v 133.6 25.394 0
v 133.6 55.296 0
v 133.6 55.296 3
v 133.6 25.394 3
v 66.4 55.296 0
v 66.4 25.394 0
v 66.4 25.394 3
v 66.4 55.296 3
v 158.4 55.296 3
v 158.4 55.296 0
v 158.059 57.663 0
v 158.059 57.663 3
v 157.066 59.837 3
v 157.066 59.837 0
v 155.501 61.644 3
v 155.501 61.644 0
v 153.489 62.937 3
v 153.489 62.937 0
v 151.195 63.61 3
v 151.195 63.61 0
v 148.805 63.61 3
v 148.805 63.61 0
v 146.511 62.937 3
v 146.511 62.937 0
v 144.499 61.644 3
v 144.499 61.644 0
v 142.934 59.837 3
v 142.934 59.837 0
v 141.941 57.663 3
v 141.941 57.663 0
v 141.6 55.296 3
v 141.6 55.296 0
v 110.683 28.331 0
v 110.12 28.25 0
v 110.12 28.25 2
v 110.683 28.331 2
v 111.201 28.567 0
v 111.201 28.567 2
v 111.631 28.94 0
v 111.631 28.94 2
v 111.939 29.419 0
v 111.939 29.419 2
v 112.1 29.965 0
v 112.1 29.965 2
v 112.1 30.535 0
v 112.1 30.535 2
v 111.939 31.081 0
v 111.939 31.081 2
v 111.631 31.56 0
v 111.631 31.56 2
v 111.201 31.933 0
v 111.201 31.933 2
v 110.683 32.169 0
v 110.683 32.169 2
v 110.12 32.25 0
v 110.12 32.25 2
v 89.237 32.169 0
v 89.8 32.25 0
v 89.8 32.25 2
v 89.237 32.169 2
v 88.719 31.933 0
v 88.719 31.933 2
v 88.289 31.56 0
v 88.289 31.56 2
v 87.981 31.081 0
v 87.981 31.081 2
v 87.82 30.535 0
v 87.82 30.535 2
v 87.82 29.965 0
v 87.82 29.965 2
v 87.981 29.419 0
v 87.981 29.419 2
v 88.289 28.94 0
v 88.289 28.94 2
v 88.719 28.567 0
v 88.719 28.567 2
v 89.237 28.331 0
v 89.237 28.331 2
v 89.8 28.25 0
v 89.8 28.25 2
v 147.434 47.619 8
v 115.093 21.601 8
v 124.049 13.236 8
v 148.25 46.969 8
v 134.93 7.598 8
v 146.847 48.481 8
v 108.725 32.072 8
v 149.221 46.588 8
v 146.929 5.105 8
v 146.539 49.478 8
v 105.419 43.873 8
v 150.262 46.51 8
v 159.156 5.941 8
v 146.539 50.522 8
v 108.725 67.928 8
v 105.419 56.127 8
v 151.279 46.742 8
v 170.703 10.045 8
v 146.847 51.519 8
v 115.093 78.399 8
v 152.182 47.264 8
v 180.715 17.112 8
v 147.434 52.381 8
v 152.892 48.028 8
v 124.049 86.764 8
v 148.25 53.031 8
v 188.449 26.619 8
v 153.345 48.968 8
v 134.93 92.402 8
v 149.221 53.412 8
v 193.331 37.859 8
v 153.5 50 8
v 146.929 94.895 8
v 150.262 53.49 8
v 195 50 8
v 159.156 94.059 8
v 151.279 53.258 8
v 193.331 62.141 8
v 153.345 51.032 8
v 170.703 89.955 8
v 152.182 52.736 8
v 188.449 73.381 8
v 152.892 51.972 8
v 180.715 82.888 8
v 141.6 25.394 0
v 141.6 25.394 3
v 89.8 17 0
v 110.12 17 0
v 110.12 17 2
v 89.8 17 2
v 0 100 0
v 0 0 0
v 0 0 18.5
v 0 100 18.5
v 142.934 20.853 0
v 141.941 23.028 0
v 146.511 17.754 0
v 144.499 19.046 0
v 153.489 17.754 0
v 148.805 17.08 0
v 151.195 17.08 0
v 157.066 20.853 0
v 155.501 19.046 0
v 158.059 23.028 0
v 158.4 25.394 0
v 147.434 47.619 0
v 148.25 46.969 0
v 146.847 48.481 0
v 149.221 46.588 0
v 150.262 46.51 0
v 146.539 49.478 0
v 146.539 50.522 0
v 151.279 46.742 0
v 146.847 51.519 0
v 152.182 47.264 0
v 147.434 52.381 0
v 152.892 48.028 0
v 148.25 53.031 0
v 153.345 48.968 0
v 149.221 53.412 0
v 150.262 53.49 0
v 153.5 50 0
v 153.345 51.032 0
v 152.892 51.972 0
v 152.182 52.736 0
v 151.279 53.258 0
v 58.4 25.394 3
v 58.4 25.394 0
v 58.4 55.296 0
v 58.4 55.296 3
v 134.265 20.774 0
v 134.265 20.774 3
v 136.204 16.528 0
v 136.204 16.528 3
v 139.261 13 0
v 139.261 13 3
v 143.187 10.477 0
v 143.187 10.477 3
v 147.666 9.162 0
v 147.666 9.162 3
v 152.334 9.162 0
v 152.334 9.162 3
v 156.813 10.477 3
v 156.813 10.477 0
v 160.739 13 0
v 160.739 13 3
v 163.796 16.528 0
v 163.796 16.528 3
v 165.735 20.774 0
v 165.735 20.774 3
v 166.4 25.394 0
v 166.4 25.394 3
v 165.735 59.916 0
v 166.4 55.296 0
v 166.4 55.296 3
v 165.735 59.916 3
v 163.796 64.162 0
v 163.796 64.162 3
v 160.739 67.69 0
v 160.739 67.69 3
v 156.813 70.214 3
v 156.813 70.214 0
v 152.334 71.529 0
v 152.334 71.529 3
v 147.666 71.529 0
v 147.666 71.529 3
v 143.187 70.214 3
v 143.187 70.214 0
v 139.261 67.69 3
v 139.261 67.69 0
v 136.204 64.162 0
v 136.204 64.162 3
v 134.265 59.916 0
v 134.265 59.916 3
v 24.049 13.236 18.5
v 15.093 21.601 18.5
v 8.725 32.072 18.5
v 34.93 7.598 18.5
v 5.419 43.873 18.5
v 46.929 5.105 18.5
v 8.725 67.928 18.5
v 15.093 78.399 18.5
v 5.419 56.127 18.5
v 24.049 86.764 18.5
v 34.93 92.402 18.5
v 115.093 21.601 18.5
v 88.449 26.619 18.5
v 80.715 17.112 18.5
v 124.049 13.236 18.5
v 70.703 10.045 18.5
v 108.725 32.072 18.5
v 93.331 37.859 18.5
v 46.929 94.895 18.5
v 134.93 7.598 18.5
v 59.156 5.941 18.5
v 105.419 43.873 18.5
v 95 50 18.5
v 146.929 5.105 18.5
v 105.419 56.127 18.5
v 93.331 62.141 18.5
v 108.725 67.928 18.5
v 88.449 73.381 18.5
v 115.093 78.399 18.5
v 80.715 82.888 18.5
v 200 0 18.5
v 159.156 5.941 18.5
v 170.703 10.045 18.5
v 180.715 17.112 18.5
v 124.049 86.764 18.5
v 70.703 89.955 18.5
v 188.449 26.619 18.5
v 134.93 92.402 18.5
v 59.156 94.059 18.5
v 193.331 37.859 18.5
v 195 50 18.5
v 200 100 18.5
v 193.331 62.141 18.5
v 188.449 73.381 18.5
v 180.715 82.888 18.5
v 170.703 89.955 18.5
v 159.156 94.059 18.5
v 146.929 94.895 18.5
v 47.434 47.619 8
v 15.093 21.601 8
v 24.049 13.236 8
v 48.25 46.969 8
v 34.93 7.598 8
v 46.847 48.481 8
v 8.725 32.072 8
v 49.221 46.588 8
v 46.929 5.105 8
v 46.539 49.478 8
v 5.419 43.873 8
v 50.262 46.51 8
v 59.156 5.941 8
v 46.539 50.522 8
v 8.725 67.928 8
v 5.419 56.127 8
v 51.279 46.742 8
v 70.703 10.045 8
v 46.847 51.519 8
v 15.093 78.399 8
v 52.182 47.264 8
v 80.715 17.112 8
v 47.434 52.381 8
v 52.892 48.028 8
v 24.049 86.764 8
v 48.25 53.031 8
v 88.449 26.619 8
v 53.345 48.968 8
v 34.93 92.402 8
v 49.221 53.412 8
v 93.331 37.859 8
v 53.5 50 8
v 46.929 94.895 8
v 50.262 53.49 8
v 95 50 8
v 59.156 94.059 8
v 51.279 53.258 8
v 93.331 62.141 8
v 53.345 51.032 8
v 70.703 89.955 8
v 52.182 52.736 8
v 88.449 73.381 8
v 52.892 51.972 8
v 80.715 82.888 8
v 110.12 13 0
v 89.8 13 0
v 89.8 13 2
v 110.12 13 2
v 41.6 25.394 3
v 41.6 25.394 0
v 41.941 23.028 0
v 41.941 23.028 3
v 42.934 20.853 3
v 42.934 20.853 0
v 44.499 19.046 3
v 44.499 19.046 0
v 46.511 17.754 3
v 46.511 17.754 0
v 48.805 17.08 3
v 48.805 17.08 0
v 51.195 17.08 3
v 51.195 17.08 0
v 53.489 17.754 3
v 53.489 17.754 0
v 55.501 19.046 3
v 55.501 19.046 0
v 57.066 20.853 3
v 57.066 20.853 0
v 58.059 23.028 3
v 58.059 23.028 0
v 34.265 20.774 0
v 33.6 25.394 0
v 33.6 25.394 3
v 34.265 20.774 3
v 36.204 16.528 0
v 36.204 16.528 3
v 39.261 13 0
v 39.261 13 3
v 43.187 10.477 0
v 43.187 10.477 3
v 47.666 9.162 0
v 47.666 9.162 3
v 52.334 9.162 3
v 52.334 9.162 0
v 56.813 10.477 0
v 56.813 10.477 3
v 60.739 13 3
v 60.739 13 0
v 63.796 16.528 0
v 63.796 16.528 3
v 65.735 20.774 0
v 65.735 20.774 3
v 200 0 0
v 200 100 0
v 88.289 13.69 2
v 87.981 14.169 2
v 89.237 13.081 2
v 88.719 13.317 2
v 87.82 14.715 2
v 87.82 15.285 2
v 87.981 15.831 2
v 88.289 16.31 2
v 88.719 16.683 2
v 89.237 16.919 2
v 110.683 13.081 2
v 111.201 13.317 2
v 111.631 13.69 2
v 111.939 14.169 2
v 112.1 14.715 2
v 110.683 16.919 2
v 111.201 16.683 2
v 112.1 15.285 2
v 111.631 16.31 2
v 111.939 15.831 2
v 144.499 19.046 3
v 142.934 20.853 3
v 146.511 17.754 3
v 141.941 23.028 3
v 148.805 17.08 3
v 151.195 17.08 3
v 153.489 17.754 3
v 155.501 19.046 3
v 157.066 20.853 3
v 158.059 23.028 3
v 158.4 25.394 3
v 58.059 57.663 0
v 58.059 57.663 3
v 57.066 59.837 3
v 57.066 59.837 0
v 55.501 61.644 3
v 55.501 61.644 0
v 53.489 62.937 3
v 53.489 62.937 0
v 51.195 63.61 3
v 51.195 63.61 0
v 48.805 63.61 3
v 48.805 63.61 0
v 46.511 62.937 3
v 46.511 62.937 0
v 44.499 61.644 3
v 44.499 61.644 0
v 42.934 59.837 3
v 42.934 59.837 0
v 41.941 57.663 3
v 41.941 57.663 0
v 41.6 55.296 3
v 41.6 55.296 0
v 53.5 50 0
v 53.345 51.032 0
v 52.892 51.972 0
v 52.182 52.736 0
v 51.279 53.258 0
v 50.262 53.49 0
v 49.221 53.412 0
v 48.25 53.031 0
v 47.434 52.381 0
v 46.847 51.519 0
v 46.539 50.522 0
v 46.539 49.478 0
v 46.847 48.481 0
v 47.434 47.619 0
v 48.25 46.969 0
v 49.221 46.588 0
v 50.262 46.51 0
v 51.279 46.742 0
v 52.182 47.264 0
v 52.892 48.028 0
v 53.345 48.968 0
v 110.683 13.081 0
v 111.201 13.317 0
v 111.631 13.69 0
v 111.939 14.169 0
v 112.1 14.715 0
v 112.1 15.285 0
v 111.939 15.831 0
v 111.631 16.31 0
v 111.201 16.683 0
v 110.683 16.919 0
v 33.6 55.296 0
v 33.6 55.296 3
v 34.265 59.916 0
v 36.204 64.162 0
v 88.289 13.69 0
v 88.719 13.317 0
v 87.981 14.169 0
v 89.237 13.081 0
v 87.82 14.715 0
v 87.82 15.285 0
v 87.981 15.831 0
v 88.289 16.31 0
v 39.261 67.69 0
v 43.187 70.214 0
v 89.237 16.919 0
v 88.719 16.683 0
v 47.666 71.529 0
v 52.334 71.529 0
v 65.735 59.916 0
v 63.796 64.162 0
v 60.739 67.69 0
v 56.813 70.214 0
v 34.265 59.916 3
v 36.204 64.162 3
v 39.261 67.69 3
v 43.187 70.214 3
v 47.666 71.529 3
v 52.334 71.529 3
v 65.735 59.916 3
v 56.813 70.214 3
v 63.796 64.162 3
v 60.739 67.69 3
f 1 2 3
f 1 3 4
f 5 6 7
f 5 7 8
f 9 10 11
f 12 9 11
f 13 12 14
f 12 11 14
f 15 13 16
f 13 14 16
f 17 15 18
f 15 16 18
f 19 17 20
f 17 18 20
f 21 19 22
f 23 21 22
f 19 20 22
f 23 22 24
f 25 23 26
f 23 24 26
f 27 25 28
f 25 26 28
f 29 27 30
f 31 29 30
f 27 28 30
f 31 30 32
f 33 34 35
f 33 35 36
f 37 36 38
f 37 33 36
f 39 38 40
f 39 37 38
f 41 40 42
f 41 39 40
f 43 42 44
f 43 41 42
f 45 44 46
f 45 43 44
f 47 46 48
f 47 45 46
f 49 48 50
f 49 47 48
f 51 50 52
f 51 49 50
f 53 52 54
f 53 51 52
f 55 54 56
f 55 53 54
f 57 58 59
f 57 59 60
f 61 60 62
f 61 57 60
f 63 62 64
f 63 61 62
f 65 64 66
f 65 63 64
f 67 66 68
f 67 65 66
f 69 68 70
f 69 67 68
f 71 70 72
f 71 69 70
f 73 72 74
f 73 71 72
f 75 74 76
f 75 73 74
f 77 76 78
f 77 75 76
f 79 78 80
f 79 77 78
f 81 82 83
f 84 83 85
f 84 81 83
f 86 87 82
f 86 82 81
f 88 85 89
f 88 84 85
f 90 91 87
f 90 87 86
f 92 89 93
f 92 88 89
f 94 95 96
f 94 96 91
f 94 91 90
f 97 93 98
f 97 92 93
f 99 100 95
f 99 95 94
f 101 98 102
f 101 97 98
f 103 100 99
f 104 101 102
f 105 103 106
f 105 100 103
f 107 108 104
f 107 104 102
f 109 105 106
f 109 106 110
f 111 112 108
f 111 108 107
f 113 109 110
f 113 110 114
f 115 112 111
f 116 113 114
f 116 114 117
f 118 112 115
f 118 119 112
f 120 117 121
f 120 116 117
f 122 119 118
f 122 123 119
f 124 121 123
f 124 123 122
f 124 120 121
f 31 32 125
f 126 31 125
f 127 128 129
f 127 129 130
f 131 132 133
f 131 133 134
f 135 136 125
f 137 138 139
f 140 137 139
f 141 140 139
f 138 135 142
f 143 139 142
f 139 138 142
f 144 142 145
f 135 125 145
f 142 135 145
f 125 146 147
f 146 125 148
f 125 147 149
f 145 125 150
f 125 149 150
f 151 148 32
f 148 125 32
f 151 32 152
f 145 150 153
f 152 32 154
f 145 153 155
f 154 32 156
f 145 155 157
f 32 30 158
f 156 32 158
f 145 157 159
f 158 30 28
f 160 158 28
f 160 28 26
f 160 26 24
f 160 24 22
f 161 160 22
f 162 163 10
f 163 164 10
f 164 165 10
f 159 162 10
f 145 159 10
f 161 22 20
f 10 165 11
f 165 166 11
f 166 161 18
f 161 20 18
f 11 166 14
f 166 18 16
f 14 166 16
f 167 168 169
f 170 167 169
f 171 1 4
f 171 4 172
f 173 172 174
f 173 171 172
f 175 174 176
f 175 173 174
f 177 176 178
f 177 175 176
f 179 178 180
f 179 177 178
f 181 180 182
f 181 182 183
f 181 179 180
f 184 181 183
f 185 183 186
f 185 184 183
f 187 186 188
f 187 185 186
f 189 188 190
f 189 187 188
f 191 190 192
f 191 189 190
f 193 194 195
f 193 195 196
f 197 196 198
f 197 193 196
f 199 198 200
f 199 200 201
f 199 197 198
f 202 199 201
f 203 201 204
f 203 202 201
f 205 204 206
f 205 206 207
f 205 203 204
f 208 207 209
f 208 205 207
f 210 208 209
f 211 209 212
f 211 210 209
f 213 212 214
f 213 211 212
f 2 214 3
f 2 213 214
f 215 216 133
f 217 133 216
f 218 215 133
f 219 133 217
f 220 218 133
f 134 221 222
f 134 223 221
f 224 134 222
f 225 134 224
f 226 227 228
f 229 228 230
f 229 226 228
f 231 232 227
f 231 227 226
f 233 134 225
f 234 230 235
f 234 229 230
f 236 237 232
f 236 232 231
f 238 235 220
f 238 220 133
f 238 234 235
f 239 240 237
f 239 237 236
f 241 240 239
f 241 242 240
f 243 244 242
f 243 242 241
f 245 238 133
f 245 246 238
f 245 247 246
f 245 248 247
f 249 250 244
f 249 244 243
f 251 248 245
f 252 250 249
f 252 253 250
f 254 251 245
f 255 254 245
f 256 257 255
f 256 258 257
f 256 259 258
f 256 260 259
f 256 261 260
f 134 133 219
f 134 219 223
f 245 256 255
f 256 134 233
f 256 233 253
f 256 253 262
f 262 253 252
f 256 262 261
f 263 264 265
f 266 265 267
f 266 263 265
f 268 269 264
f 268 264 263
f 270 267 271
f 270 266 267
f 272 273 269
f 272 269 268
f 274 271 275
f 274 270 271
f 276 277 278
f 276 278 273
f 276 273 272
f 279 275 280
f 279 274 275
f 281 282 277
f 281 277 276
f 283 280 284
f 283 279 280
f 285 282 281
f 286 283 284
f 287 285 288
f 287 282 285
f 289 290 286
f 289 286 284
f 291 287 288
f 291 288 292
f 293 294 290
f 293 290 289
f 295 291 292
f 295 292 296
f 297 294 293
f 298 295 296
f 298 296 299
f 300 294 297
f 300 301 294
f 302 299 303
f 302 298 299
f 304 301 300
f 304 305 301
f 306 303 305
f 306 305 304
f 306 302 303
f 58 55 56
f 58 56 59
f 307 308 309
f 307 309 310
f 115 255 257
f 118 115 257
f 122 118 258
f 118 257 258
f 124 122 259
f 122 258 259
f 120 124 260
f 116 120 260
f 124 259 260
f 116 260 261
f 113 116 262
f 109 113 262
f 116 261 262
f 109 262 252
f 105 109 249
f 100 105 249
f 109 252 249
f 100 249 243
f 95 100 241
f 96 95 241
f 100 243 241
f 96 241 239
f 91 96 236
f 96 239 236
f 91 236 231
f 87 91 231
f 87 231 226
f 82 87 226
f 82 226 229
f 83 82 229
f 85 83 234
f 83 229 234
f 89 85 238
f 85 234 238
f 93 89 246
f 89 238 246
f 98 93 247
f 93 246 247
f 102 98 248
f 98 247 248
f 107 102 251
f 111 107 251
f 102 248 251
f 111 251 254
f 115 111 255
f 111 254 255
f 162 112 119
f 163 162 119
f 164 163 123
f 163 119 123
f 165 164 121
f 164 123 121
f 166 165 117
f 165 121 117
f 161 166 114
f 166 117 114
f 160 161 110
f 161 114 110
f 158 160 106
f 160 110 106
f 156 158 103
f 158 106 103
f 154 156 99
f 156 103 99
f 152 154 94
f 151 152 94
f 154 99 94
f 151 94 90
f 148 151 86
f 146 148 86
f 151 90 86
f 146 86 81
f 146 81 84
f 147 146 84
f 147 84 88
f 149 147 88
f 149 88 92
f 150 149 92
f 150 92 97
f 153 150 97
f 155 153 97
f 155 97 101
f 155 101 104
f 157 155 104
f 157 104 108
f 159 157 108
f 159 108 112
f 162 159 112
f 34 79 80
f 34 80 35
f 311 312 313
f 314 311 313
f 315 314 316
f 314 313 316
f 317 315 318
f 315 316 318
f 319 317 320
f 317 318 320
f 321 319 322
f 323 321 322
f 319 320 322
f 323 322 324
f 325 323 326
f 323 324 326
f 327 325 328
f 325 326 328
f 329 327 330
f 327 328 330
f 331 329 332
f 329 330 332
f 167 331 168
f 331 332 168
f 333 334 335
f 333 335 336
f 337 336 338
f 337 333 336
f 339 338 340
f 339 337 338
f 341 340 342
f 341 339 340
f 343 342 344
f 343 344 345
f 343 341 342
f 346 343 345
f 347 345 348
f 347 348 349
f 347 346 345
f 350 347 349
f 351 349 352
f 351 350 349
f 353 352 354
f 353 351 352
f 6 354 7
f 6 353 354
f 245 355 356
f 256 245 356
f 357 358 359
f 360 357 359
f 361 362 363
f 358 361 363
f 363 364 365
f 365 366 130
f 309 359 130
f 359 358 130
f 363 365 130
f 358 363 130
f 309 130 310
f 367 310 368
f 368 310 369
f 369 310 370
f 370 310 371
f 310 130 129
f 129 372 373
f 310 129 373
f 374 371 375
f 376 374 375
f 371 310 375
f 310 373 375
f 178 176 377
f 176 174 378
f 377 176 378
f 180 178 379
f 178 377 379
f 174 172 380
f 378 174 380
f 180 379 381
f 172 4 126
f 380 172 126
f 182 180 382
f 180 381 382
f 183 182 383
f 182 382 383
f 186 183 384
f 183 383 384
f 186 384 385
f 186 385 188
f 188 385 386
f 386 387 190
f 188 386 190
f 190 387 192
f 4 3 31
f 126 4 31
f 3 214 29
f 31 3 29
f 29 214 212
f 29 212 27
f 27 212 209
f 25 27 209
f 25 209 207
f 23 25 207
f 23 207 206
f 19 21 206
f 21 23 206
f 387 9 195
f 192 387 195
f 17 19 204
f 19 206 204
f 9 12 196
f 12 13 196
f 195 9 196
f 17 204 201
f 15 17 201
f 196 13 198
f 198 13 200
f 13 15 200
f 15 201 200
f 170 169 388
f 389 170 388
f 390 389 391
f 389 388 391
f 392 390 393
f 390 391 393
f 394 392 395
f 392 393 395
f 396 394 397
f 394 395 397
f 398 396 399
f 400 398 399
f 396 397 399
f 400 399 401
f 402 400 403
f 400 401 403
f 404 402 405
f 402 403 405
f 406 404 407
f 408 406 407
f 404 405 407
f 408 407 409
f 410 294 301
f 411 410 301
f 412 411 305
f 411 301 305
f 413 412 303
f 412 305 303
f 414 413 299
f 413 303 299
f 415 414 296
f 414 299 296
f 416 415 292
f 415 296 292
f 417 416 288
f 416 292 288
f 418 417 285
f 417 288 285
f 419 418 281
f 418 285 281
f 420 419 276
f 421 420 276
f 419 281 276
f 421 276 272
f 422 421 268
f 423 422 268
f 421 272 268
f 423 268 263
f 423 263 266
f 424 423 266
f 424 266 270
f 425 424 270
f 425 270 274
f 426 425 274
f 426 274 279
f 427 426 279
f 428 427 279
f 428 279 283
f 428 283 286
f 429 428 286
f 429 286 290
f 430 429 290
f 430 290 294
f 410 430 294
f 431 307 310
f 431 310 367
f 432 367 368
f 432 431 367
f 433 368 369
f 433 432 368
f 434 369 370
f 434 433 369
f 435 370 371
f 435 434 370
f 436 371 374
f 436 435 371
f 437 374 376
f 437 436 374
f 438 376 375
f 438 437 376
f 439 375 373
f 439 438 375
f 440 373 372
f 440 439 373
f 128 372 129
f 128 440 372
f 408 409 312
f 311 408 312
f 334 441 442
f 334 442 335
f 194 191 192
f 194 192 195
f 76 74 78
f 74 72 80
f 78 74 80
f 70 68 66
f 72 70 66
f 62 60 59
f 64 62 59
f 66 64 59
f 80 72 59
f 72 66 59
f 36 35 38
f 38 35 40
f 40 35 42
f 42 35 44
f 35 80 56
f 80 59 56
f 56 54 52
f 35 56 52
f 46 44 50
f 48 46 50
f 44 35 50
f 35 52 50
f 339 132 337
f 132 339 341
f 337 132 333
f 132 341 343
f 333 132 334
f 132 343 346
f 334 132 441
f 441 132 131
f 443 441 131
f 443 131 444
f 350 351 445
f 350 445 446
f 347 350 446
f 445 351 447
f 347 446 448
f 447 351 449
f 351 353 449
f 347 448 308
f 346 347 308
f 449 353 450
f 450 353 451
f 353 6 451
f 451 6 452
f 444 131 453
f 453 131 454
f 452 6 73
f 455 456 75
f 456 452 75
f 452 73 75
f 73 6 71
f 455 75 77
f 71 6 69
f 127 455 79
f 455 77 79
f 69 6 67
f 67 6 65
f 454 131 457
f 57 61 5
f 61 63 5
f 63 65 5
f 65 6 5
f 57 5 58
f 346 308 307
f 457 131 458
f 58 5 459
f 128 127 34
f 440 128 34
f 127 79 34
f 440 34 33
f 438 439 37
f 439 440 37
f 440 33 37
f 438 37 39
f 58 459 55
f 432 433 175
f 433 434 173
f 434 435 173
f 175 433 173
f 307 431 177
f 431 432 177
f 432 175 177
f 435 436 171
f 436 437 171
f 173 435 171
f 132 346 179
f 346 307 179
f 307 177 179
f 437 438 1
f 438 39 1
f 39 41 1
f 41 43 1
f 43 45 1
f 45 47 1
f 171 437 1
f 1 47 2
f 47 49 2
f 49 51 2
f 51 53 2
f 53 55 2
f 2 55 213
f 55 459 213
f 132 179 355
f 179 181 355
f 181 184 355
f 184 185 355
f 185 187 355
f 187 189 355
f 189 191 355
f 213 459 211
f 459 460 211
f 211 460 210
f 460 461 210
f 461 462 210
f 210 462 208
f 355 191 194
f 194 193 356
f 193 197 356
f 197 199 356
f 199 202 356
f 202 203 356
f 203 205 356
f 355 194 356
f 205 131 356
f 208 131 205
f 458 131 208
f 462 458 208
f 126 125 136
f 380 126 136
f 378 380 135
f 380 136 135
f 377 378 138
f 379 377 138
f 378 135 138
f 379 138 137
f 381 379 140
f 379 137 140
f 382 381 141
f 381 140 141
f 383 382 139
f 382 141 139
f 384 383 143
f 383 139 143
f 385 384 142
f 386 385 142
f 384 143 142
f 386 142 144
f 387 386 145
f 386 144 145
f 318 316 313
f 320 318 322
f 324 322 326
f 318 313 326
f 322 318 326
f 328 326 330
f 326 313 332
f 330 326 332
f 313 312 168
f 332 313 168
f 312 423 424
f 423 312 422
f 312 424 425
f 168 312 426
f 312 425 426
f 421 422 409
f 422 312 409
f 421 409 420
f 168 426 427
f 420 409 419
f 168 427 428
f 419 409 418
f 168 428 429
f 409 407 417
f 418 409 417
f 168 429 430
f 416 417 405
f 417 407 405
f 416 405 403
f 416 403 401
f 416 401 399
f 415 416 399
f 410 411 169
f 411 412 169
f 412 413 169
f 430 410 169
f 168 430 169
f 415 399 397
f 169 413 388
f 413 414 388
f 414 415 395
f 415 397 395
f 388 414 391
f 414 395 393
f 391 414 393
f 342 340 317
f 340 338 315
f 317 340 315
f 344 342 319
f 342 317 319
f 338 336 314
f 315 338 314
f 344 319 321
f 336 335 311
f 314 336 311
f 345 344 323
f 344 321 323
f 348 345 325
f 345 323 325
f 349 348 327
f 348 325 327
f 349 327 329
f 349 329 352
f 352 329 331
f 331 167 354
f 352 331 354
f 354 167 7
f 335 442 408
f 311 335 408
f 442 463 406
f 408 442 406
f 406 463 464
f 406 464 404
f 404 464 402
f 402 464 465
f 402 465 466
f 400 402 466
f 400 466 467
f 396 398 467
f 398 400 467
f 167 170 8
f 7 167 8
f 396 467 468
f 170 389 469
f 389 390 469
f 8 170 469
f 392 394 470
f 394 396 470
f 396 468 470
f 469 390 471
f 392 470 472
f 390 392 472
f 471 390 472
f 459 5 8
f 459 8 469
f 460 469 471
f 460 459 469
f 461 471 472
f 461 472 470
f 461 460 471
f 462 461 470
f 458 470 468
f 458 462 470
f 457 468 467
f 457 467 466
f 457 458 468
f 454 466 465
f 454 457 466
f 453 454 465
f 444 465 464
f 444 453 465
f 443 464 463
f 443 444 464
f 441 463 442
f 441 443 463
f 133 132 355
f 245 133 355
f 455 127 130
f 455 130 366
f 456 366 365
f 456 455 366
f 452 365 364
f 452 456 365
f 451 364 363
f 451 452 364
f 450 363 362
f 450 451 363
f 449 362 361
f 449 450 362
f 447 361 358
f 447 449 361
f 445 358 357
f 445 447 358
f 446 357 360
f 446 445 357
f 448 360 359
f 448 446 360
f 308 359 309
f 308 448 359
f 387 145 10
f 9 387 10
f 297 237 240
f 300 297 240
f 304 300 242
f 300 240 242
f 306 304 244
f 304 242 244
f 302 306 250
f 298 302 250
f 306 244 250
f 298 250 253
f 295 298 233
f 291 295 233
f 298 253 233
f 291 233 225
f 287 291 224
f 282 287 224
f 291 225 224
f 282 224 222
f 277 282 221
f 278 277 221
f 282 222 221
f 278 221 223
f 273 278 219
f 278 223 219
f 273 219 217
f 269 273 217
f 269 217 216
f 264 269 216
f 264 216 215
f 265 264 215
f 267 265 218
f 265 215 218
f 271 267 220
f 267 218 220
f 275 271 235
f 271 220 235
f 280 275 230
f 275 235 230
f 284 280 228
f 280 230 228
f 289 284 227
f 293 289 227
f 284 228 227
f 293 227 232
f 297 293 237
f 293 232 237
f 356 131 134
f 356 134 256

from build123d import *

# Parameters (mm, degrees)
SKETCH1_W           = 200
SKETCH1_H           = 100
BOSS_EXTRUDE1_DEPTH = 18.5
SKETCH2_R           = 45
CUT_EXTRUDE1_DEPTH  = 10.5
SKETCH3_R           = 3.5
CUT_EXTRUDE2_DEPTH  = 19.5
CUT_EXTRUDE4_DEPTH  = 3
CUT_EXTRUDE5_DEPTH  = 2


with BuildPart() as part:
    # Sketch1 → Boss-Extrude1 (new body)
    with BuildSketch(Plane.XY):
        with Locations((100, 50)):
            Rectangle(SKETCH1_W, SKETCH1_H)
    extrude(amount=BOSS_EXTRUDE1_DEPTH)

    # Sketch2 → Cut-Extrude1 (cut)
    with BuildSketch(Plane.XY.offset(18.5)):
        with Locations((50, 50)):
            Circle(SKETCH2_R)
        with Locations((150, 50)):
            Circle(SKETCH2_R)
    extrude(amount=-CUT_EXTRUDE1_DEPTH, mode=Mode.SUBTRACT)

    # Sketch3 → Cut-Extrude2 (cut, through all)
    with BuildSketch(Plane.XY.offset(18.5)):
        with Locations((50, 50)):
            Circle(SKETCH3_R)
        with Locations((150, 50)):
            Circle(SKETCH3_R)
    extrude(amount=-CUT_EXTRUDE2_DEPTH, mode=Mode.SUBTRACT)

    # Sketch4 → Cut-Extrude4 (cut)
    with BuildSketch(Plane(origin=(0, 0, 0), x_dir=(-1, 0, 0), z_dir=(0, 0, -1))):
        with BuildLine():
            Line((-133.600331897, 55.296115572), (-133.600331897, 25.39429873))
            ThreePointArc((-133.600331897, 25.39429873), (-150, 8.994630628), (-166.399668103, 25.39429873))
            Line((-166.399668103, 25.39429873), (-166.399668103, 55.296115572))
            ThreePointArc((-166.399668103, 55.296115572), (-150, 71.695783675), (-133.600331897, 55.296115572))
        make_face()
        with BuildLine():
            Line((-141.600331897, 55.296115572), (-141.600331897, 25.39429873))
            ThreePointArc((-141.600331897, 25.39429873), (-150, 16.994630628), (-158.399668103, 25.39429873))
            Line((-158.399668103, 25.39429873), (-158.399668103, 55.296115572))
            ThreePointArc((-158.399668103, 55.296115572), (-150, 63.695783675), (-141.600331897, 55.296115572))
        make_face(mode=Mode.SUBTRACT)
        with BuildLine():
            Line((-33.600331897, 55.296115572), (-33.600331897, 25.39429873))
            ThreePointArc((-33.600331897, 25.39429873), (-50, 8.994630628), (-66.399668103, 25.39429873))
            Line((-66.399668103, 25.39429873), (-66.399668103, 55.296115572))
            ThreePointArc((-66.399668103, 55.296115572), (-50, 71.695783675), (-33.600331897, 55.296115572))
        make_face()
        with BuildLine():
            Line((-41.600331897, 55.296115572), (-41.600331897, 25.39429873))
            ThreePointArc((-41.600331897, 25.39429873), (-50, 16.994630628), (-58.399668103, 25.39429873))
            Line((-58.399668103, 25.39429873), (-58.399668103, 55.296115572))
            ThreePointArc((-58.399668103, 55.296115572), (-50, 63.695783675), (-41.600331897, 55.296115572))
        make_face(mode=Mode.SUBTRACT)
    extrude(amount=-CUT_EXTRUDE4_DEPTH, mode=Mode.SUBTRACT)

    # Sketch5 → Cut-Extrude5 (cut)
    with BuildSketch(Plane(origin=(0, 0, 0), x_dir=(-1, 0, 0), z_dir=(0, 0, -1))):
        with BuildLine():
            Line((-110.1200005, 32.2499995), (-89.8000005, 32.2499995))
            ThreePointArc((-89.8000005, 32.2499995), (-87.8000005, 30.2499995), (-89.8000005, 28.2499995))
            Line((-89.8000005, 28.2499995), (-110.1200005, 28.2499995))
            ThreePointArc((-110.1200005, 28.2499995), (-112.1200005, 30.2499995), (-110.1200005, 32.2499995))
        make_face()
        with BuildLine():
            Line((-110.1200005, 16.9999995), (-89.8000005, 16.9999995))
            ThreePointArc((-89.8000005, 16.9999995), (-87.8000005, 14.9999995), (-89.8000005, 12.9999995))
            Line((-89.8000005, 12.9999995), (-110.1200005, 12.9999995))
            ThreePointArc((-110.1200005, 12.9999995), (-112.1200005, 14.9999995), (-110.1200005, 16.9999995))
        make_face()
    extrude(amount=-CUT_EXTRUDE5_DEPTH, mode=Mode.SUBTRACT)


solid = part.part
